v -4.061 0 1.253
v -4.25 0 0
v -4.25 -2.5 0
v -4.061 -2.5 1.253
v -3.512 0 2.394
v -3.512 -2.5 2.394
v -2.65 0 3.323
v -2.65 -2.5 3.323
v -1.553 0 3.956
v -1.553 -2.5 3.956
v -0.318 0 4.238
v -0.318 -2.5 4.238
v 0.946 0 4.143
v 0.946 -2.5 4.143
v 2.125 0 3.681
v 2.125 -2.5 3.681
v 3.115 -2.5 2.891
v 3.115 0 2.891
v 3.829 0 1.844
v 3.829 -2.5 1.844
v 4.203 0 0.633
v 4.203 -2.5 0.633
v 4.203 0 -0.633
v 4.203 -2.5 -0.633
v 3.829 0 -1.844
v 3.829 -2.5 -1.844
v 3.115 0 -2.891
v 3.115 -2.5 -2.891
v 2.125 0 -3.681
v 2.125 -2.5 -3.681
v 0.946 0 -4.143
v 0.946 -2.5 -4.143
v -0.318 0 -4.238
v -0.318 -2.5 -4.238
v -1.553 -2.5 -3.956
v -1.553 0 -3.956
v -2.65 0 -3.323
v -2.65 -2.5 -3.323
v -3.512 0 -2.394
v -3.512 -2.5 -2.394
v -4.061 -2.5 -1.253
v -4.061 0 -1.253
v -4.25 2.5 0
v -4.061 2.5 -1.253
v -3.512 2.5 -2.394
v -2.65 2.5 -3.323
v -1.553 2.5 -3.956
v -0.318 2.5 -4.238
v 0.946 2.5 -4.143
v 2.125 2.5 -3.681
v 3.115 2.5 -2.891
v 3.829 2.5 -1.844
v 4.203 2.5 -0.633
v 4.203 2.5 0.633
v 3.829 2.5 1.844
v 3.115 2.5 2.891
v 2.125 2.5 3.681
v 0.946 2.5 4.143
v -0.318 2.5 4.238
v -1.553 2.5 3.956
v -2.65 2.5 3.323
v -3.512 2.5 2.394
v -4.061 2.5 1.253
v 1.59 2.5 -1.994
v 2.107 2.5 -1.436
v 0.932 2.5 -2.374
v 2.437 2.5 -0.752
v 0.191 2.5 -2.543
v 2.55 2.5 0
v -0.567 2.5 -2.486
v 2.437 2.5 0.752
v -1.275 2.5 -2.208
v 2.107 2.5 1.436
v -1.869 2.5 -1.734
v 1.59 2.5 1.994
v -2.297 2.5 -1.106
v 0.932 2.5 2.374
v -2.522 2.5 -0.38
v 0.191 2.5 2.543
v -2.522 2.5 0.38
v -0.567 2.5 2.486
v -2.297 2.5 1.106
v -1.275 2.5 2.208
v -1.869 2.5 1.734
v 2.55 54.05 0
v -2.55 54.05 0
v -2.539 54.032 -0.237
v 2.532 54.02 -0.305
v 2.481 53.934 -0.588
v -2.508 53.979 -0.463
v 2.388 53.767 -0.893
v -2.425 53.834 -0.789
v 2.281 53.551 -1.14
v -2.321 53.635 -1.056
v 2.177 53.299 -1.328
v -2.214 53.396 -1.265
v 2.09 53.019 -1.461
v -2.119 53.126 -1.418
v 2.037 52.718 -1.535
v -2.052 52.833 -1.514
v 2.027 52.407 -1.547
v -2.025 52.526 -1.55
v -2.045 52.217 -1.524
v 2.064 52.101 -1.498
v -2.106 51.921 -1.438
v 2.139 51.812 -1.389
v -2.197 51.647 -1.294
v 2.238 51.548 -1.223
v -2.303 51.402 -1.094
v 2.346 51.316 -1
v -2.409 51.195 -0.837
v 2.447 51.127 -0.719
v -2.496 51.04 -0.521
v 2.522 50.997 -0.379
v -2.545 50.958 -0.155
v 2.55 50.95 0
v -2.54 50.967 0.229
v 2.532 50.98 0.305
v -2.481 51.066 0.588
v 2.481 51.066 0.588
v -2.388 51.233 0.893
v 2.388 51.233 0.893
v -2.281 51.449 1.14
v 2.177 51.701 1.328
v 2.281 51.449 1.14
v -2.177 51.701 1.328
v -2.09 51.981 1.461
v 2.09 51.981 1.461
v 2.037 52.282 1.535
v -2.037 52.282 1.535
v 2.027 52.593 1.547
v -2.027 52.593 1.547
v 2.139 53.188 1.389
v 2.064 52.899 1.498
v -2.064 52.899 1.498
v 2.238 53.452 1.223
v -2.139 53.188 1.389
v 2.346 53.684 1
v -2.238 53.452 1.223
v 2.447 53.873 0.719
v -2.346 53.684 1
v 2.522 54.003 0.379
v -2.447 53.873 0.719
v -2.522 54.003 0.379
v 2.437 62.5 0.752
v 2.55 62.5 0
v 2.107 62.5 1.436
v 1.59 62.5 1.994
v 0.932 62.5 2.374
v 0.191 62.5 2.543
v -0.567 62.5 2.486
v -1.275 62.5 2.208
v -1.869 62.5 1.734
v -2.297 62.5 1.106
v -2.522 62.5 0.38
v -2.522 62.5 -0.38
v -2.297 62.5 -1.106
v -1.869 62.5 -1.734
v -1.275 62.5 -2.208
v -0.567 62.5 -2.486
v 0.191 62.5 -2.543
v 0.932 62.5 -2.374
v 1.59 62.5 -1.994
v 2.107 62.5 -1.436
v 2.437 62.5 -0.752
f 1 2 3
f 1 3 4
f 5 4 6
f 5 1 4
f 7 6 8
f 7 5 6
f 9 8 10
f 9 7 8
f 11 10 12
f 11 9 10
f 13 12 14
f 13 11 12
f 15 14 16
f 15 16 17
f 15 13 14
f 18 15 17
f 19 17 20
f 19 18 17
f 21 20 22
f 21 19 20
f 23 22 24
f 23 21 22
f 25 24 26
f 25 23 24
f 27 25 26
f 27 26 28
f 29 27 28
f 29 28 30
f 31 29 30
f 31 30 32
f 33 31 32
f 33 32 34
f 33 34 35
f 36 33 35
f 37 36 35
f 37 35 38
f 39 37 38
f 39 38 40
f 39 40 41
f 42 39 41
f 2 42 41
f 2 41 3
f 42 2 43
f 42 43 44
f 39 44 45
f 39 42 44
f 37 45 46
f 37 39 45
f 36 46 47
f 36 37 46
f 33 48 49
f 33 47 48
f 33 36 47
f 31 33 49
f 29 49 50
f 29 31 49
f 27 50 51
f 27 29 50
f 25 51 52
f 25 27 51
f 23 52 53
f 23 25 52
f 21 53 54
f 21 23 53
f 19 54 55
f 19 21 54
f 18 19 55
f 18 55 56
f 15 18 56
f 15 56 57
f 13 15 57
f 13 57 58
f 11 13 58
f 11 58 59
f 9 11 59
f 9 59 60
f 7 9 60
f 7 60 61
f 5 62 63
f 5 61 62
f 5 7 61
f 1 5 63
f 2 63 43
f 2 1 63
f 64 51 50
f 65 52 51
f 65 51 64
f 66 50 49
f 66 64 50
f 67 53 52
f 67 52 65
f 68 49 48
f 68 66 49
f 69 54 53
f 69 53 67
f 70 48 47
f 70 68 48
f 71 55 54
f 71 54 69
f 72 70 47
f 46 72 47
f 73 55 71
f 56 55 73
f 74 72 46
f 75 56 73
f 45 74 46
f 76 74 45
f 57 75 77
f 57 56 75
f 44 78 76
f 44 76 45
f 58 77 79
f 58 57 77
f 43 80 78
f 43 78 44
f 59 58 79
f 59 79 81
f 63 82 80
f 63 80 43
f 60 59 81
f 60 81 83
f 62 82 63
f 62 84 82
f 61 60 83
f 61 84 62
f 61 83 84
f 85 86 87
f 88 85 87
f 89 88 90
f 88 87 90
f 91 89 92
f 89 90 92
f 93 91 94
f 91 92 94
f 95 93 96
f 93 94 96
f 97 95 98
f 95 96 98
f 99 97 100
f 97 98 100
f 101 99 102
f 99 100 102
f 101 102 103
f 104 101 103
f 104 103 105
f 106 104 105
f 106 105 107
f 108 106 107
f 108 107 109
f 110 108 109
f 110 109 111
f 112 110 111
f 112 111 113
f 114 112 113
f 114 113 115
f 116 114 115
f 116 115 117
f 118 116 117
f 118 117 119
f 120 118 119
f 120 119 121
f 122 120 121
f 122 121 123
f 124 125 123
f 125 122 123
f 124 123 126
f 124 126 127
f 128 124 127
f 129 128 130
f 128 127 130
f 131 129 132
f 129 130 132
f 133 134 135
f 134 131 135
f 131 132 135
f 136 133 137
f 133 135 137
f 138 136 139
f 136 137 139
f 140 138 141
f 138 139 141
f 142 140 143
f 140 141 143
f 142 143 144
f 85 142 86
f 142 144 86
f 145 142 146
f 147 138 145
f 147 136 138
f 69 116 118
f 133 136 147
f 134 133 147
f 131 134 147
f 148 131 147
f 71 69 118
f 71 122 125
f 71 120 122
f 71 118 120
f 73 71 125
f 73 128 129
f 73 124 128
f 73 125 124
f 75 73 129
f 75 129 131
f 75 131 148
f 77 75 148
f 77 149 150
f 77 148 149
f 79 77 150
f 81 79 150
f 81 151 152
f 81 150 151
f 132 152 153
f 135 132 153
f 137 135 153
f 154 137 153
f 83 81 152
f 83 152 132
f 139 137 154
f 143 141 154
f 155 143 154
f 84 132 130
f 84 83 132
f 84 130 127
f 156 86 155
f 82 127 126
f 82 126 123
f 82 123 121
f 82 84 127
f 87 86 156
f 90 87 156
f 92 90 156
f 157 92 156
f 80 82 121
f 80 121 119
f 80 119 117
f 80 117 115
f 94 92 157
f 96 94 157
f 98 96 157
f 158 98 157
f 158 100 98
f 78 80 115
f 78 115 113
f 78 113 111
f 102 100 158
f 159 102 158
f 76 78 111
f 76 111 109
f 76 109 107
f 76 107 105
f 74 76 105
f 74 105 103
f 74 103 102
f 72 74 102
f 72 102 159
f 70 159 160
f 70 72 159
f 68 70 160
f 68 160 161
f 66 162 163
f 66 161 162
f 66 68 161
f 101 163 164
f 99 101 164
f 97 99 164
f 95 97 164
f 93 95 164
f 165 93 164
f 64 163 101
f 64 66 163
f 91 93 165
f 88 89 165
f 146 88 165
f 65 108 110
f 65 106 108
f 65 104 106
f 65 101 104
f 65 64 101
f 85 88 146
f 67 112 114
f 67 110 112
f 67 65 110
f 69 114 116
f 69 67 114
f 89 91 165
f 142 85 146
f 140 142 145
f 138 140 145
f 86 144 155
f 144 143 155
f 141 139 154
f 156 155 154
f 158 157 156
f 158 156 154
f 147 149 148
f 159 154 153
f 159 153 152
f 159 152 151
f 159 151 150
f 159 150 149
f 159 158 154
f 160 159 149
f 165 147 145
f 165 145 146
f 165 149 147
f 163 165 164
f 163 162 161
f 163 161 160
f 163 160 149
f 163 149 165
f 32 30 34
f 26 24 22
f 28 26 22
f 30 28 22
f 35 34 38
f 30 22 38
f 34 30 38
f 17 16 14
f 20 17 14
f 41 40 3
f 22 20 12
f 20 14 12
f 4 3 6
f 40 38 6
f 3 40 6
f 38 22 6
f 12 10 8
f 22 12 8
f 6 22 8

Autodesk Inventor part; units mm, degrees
ref_plane "XZ Plane" through (0, 0, 0) normal (0, 1, 0) x (-1, 0, 0)
ref_plane "XY Plane" through (0, 0, 0) normal (0, 0, 1) x (1, 0, 0)
sketch "Szkic1" plane through (0, 0, 0) normal (0, 1, 0) x (-1, 0, 0)
  circle A0 centre (0, 0) radius 4.25
  dimension "d0" = 8.5
extrude "Wyciągnięcie proste1" add sketch "Szkic1" along normal mid plane 5
sketch "Szkic2" plane through (0, 2.5, 0) normal (0, 1, 0) x (1, 0, 0)
  circle A0 centre (0, 0) radius 2.55
  dimension "d3" = 5.1
extrude "Wyciągnięcie proste2" add sketch "Szkic2" along normal blind 60
ref_plane "Płaszczyzna konstrukcyjna1" through (-2.65, 0, 0) normal (1, 0, 0) x (0, 1, 0)
sketch "Szkic3" plane through (-2.65, 0, 0) normal (1, 0, 0) x (0, 1, 0)
  point P0 (0, 0)
sketch "Szkic4" plane through (-2.65, 0, 0) normal (1, 0, 0) x (0, 1, 0)
  circle A0 centre (52.5, 0) radius 1.55
  line L0 (62.5, -2.55) -> (62.5, 2.55) projected
  point P0 (0, 0)
  dimension "d8" = 3.1
  dimension "d9" = 10
extrude "Wyciągnięcie proste3" cut sketch "Szkic4" along normal blind 50
properties part number "sworzen"
